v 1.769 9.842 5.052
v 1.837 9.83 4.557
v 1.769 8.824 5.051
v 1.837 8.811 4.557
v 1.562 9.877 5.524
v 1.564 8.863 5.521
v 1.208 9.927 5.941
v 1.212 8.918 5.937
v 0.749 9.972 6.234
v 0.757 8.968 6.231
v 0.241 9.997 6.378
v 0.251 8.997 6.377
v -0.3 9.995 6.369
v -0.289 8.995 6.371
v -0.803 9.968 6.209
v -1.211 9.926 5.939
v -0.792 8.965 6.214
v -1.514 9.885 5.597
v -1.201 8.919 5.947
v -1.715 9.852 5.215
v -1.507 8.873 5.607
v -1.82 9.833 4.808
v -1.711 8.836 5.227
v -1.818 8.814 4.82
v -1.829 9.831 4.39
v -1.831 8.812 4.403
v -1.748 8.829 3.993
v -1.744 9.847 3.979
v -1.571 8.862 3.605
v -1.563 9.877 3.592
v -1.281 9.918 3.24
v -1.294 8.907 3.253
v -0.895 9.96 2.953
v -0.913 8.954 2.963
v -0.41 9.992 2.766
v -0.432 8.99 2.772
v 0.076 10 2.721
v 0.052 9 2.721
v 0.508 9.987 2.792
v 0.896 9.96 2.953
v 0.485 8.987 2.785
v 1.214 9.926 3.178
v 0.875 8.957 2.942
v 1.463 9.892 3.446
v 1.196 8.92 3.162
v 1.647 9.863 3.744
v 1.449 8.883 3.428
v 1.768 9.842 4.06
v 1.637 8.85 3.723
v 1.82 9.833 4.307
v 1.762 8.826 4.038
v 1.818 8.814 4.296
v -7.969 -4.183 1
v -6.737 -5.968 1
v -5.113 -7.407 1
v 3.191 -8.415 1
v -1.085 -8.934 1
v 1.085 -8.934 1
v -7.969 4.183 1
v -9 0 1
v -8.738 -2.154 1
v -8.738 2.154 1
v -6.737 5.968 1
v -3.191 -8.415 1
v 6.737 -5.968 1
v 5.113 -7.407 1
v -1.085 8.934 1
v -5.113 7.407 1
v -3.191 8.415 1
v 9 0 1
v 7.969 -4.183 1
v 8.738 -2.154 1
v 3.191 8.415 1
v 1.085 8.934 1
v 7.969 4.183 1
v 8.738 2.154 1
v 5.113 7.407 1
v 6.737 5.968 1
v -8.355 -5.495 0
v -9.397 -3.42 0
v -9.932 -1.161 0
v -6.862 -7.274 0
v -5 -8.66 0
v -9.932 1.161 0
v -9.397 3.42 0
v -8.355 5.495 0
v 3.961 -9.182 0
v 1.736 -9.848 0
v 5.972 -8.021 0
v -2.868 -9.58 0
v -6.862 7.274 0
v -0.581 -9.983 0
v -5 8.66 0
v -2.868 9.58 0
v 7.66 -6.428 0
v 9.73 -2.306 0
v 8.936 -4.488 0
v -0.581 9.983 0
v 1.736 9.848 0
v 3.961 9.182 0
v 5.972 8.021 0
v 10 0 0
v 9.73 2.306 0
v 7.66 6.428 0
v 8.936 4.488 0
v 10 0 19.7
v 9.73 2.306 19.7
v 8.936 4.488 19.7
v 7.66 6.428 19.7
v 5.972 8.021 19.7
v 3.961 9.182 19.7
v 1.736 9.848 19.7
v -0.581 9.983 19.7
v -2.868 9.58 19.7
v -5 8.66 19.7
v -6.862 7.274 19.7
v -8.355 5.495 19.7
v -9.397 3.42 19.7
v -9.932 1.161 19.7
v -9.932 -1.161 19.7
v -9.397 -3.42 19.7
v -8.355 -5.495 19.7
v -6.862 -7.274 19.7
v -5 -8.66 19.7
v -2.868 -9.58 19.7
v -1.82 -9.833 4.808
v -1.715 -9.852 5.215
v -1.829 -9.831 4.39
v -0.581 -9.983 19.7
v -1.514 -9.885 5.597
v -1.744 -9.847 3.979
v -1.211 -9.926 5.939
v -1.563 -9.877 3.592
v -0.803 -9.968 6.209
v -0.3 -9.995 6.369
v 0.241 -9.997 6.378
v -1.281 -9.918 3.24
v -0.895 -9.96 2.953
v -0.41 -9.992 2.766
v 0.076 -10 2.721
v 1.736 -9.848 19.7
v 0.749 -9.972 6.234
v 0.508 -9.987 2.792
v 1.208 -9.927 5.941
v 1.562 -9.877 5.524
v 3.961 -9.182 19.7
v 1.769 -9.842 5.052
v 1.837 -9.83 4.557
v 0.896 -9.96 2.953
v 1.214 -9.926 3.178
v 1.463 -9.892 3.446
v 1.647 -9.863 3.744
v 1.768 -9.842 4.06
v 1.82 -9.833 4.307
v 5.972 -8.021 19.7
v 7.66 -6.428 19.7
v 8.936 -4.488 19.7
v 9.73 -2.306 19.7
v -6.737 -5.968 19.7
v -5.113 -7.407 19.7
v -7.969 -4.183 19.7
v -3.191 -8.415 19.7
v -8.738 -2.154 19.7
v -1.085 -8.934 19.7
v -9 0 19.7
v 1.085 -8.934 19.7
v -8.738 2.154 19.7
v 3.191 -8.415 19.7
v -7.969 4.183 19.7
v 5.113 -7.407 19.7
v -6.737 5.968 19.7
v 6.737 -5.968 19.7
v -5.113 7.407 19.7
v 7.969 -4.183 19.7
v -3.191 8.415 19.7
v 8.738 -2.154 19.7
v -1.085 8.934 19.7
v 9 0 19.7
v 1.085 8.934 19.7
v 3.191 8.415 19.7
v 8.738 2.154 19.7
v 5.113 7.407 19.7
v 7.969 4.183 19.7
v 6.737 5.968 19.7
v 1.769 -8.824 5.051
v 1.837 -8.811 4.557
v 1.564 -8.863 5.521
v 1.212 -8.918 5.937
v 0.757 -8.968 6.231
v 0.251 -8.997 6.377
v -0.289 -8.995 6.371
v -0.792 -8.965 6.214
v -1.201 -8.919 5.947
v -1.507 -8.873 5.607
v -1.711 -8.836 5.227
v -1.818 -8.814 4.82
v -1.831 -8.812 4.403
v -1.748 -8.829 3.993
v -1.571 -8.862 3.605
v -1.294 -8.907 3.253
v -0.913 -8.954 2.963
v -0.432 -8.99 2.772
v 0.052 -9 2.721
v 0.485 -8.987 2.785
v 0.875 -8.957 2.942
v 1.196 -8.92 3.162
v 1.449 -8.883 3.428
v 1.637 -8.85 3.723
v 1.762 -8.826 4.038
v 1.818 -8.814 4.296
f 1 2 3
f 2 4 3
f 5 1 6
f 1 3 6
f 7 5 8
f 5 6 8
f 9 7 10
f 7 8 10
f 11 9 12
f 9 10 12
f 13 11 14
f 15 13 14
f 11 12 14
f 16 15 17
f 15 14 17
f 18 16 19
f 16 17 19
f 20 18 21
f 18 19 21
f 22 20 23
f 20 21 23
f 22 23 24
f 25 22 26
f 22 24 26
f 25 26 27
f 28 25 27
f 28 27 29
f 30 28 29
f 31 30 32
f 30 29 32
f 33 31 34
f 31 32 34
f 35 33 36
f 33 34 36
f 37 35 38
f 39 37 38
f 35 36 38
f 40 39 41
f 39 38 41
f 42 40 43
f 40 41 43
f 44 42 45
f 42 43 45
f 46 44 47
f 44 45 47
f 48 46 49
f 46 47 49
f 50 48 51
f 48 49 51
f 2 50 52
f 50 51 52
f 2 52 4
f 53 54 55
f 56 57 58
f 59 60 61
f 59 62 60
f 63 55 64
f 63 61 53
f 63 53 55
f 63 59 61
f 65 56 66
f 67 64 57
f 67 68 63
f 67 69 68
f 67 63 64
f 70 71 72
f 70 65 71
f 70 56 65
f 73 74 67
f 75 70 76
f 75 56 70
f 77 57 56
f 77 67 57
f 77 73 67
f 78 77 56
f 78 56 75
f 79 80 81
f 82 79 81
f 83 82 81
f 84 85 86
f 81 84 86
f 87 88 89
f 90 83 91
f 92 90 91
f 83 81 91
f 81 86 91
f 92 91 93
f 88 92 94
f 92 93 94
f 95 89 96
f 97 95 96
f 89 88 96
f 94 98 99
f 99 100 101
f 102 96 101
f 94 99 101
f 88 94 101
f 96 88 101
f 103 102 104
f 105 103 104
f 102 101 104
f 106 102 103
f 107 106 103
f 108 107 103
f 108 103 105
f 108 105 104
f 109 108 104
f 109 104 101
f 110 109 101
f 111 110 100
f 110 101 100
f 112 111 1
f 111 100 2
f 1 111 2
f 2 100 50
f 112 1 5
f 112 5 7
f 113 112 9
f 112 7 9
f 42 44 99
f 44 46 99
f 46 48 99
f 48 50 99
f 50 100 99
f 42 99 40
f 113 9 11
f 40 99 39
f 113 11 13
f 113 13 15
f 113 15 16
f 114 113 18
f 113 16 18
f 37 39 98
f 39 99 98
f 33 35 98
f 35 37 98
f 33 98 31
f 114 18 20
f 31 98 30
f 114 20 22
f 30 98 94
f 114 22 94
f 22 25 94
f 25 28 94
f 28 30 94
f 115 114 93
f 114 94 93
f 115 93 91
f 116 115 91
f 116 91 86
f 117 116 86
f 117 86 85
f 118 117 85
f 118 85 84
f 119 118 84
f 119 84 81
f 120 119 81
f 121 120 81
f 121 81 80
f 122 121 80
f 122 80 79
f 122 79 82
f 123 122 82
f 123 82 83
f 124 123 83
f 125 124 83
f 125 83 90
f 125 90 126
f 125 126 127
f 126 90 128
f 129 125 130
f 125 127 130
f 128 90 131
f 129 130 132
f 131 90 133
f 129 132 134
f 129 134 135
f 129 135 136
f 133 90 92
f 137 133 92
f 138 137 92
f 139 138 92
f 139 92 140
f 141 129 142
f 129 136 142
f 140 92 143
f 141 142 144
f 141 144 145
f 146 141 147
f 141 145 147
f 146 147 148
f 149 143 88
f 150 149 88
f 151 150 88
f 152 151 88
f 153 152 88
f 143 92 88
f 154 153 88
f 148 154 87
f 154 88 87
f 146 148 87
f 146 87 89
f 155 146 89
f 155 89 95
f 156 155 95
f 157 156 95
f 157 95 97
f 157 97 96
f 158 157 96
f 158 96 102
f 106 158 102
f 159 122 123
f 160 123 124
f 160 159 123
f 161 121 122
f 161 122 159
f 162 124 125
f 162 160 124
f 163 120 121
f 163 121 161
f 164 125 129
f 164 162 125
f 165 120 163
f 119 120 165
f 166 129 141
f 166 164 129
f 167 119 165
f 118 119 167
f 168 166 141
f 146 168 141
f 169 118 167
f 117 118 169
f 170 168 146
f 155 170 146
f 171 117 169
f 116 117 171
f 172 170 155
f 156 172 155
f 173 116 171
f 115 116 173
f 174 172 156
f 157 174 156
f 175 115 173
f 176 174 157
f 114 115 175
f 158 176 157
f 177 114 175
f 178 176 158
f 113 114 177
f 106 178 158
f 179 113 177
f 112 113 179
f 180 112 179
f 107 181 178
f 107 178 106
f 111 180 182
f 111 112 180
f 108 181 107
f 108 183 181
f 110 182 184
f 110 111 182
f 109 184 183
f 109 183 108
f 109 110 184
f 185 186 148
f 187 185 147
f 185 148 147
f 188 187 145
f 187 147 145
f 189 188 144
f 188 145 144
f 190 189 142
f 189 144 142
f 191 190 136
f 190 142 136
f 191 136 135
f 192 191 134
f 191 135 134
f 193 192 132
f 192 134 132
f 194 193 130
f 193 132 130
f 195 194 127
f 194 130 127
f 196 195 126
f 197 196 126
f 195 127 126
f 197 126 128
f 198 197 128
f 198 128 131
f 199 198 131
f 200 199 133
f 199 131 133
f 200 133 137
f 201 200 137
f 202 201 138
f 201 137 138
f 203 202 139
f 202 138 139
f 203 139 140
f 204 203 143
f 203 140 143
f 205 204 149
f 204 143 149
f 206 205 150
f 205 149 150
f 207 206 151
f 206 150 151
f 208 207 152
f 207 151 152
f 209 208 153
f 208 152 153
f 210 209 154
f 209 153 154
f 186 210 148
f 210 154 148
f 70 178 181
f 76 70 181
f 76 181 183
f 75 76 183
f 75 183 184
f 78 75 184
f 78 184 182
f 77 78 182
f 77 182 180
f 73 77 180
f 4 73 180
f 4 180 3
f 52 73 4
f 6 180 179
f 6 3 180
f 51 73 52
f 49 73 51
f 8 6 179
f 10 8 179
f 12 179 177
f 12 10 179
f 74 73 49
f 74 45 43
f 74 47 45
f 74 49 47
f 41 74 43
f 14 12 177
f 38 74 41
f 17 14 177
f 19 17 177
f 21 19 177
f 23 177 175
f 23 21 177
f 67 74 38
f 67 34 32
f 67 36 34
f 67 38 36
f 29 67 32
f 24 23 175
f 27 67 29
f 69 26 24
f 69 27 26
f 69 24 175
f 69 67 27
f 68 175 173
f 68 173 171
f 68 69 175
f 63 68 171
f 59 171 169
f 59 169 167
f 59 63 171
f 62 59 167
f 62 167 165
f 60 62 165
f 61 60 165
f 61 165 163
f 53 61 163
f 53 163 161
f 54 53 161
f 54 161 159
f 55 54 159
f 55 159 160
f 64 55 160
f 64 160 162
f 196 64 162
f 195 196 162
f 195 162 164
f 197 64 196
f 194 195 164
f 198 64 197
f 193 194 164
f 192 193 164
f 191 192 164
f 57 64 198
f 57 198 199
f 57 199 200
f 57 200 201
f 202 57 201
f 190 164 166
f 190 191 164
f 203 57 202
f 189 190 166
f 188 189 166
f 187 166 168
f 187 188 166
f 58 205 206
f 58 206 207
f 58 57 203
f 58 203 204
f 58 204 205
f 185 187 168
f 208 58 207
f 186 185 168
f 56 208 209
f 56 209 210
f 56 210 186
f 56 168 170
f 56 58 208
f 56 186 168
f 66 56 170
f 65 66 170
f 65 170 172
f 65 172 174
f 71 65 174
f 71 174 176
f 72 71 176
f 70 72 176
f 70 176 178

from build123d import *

# Parameters (mm, degrees)
F0_R     = 10
F1_DEPTH = 19.7
F2_T     = -1
F3_R     = 1.837004
F4_DEPTH = 11.6


with BuildPart() as f1:
    # F0 (on Top) → F1 (new body)
    with BuildSketch(Plane.XY):
        Circle(F0_R)
    extrude(amount=F1_DEPTH)

    # F2
    f2_openings = [f1.faces().sort_by_distance(p)[0] for p in [
        (0, 0, 19.7),
    ]]
    offset(amount=F2_T, openings=f2_openings)

    # F3 (on Front) → F4 (cut, symmetric)
    with BuildSketch(Plane.XZ):
        with Locations((0, 4.556882)):
            Circle(F3_R)
    extrude(amount=F4_DEPTH, both=True, mode=Mode.SUBTRACT)


solid = f1.part
